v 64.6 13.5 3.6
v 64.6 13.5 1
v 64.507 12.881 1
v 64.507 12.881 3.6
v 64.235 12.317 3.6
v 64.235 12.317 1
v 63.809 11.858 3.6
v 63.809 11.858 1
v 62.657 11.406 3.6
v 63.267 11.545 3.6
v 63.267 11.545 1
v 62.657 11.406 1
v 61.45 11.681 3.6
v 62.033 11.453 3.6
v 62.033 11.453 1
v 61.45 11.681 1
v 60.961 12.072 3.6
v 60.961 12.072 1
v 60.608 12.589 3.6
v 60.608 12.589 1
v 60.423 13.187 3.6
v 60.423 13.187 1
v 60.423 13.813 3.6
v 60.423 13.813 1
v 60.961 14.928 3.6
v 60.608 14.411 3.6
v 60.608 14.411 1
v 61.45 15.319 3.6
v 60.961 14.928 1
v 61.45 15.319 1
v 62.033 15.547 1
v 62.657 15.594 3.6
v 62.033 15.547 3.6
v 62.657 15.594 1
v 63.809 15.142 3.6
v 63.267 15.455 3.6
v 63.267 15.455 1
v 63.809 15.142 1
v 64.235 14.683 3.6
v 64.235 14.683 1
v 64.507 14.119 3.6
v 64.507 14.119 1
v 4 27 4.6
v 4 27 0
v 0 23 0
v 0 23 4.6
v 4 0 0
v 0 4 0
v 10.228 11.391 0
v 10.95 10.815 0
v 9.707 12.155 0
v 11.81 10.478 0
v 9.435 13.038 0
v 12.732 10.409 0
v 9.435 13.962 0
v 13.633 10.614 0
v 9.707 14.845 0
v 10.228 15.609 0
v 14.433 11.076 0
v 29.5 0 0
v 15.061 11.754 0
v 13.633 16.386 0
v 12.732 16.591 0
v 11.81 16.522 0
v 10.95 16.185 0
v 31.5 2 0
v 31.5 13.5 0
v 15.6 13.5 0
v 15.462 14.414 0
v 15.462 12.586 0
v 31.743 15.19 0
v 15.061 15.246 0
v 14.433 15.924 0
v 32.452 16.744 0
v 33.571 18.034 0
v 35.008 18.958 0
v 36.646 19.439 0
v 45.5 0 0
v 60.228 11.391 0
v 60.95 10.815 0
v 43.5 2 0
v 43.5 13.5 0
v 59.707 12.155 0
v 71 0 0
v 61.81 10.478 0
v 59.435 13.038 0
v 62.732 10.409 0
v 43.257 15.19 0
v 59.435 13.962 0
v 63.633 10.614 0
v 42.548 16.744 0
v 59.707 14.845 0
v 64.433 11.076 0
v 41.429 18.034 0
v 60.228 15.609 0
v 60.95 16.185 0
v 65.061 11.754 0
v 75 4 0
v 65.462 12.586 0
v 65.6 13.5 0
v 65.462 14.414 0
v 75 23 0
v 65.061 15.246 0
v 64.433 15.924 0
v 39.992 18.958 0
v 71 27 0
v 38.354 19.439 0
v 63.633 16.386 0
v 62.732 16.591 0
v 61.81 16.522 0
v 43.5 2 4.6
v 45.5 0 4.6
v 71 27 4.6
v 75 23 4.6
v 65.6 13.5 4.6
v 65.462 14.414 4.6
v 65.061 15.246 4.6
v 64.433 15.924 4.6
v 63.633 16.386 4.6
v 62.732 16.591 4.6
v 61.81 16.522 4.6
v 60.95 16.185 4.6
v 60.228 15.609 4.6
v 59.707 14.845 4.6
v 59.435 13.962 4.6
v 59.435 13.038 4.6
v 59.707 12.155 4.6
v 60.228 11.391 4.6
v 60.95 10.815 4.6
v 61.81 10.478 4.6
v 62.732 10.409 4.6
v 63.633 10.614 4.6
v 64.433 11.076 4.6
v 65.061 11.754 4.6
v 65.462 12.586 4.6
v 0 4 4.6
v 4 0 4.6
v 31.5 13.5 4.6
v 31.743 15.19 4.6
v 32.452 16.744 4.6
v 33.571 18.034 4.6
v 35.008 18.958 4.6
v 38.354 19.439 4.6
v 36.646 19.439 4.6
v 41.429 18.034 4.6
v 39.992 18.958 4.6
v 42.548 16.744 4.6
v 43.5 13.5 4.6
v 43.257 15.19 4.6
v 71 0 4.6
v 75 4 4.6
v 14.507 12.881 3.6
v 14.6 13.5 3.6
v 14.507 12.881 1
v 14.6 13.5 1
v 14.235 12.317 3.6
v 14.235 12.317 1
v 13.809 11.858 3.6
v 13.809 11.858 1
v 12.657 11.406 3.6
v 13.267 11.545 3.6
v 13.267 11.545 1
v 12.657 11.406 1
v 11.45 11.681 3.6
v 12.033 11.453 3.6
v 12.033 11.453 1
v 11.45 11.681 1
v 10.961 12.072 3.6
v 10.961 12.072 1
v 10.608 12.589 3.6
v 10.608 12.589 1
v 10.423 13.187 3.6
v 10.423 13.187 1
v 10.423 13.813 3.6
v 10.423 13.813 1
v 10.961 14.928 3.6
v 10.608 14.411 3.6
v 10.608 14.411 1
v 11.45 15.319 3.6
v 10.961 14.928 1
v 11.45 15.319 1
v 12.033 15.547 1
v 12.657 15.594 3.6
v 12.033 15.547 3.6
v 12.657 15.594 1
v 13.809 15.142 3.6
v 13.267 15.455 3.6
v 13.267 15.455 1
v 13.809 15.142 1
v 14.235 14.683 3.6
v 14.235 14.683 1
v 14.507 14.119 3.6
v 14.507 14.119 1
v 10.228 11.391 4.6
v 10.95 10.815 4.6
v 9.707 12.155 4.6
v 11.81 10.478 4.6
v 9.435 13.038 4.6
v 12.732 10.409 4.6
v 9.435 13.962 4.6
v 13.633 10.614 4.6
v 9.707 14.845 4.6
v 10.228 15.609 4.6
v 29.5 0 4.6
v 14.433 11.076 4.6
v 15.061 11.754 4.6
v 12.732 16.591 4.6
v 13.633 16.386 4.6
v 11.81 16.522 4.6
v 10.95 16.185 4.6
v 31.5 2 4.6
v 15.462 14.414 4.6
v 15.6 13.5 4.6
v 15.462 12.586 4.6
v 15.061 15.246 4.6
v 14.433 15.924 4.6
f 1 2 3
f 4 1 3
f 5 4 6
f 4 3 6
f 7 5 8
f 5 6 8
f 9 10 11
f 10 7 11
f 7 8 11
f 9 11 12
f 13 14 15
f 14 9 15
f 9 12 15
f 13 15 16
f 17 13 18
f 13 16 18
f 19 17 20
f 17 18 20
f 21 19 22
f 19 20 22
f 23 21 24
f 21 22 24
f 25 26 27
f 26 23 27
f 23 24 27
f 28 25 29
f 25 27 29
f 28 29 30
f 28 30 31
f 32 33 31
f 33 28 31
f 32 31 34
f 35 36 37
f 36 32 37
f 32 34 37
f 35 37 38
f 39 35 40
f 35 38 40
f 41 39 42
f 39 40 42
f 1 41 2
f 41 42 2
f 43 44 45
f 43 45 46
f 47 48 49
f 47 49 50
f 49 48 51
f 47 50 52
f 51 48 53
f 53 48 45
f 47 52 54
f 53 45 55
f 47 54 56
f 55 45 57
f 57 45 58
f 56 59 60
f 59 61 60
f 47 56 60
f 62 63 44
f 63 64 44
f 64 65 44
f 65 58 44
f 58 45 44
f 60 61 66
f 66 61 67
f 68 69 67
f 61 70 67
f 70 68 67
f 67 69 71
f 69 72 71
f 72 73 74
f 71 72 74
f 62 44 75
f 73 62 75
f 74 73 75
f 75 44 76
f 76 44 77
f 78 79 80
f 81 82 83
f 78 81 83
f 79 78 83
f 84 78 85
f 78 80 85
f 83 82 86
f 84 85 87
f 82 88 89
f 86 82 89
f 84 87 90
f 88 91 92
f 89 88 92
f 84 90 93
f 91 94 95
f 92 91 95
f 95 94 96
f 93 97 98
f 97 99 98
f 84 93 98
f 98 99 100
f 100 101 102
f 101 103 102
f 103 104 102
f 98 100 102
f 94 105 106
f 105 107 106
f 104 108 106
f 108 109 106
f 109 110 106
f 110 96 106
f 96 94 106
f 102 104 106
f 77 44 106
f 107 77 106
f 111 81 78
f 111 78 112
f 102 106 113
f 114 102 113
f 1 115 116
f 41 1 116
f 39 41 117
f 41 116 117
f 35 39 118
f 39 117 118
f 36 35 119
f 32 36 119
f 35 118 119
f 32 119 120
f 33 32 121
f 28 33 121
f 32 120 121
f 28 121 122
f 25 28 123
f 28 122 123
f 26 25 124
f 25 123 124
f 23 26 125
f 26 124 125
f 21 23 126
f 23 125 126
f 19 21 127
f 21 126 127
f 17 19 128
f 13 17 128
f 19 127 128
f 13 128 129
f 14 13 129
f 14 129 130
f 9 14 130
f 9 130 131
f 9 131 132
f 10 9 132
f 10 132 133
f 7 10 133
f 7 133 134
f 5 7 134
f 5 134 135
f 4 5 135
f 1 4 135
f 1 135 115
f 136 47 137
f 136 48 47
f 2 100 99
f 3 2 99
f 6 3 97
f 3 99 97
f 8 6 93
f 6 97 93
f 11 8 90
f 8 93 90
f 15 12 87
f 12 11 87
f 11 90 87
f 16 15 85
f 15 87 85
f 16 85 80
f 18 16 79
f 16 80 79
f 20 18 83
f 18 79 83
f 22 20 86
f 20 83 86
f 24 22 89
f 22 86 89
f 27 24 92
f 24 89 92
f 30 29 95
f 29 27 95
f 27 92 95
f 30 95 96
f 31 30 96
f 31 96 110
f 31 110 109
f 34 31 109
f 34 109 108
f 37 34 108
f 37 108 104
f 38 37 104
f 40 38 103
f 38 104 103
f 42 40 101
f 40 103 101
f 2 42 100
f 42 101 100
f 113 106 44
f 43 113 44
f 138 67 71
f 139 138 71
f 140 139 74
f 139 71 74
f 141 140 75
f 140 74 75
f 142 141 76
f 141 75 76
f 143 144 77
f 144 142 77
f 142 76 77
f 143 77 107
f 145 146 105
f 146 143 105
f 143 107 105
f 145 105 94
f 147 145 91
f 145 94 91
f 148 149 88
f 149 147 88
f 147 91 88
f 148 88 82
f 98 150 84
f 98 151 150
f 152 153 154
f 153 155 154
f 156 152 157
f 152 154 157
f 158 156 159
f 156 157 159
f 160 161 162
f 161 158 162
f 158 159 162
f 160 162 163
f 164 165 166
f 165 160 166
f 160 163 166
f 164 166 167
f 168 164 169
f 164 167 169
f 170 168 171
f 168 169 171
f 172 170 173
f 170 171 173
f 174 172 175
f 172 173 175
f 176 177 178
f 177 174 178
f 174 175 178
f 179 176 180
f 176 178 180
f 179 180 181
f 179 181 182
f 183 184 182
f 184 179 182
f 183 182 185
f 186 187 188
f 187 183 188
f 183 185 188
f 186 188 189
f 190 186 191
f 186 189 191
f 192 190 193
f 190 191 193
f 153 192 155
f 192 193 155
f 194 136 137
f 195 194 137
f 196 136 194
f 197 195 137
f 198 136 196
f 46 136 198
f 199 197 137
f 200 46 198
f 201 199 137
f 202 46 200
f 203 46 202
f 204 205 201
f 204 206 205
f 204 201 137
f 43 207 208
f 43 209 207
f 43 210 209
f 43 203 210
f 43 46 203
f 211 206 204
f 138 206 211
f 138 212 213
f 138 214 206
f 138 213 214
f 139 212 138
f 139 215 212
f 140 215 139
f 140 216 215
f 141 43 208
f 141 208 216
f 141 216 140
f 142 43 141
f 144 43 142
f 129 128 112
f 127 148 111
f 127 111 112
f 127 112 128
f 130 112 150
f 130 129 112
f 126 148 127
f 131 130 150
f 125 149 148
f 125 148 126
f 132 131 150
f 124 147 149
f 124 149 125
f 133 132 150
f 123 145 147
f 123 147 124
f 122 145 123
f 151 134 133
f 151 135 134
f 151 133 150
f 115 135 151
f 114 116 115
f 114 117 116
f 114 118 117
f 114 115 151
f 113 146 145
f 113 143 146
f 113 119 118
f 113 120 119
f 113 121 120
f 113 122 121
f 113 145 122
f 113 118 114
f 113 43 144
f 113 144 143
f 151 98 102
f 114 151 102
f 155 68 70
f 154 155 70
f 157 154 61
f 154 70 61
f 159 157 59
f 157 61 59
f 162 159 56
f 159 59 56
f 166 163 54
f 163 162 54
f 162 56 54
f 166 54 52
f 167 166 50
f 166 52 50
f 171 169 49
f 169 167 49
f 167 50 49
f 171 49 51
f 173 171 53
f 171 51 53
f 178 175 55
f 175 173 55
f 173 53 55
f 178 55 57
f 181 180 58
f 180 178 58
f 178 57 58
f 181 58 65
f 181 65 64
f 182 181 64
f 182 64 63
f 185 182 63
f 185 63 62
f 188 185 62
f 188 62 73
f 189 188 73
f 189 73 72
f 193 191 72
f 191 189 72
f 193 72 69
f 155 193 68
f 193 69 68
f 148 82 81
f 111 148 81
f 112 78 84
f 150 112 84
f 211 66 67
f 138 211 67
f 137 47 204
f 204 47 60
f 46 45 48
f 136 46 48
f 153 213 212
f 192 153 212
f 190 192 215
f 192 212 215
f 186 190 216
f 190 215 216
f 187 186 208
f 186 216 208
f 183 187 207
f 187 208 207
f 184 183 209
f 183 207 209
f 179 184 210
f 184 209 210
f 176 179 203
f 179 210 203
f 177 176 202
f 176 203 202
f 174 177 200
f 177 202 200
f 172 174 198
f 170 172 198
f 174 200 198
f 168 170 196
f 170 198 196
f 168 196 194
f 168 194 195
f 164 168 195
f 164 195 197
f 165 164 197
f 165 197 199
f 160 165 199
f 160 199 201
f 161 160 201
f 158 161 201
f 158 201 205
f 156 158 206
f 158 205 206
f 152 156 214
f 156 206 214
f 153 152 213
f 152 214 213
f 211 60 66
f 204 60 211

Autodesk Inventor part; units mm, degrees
ref_plane "YZ Plane" through (0, 0, 0) normal (1, 0, 0) x (0, 1, 0)
ref_plane "XZ Plane" through (0, 0, 0) normal (0, 1, 0) x (-1, 0, 0)
ref_plane "XY Plane" through (0, 0, 0) normal (0, 0, 1) x (1, 0, 0)
sketch "Sketch1" plane through (0, 0, 0) normal (0, 0, 1) x (1, 0, 0)
  line L0 (75, 0) -> (75, 27)
  line L1 (75, 27) -> (0, 27)
  line L2 (0, 27) -> (0, 0)
  line L3 (31.5, 0) -> (31.5, 13.5)
  arc A0 (43.5, 13.5) -> (31.5, 13.5) centre (37.5, 13.5) ccw
  line L4 (43.5, 13.5) -> (43.5, 0)
  line L5 (0, 0) -> (31.5, 0)
  line L6 (43.5, 0) -> (75, 0)
  circle A1 centre (12.5, 13.5) radius 2.1
  circle A2 centre (62.5, 13.5) radius 2.1
  point P0 (37.5, 27)
  point P1 (0, 13.5)
  dimension "d0" = 12
  dimension "d1" = 4.2
  dimension "d2" = 50
  dimension "d3" = 25
  dimension "d4" = 75
  dimension "d6" = 13.5
extrude "Extrusion1" add sketch "Sketch1" along normal blind 4.6
chamfer "Chamfer1" distance 4 angle 45 4 edges at (0, 27, 2.3) (0, 0, 2.3) (75, 0, 2.3) (75, 27, 2.3)
chamfer "Chamfer2" distance 2 angle 45 2 edges at (31.5, 0, 2.3) (43.5, 0, 2.3)
chamfer "Chamfer3" distance 1 angle 45 4 edges at (10.4, 13.5, 4.6) (10.4, 13.5, 0) (60.4, 13.5, 0) (60.4, 13.5, 4.6)
equation "\"d3\" = 0.5 * d2"
properties part number "hotend_mount" material "Polycarbonate, Clear"
